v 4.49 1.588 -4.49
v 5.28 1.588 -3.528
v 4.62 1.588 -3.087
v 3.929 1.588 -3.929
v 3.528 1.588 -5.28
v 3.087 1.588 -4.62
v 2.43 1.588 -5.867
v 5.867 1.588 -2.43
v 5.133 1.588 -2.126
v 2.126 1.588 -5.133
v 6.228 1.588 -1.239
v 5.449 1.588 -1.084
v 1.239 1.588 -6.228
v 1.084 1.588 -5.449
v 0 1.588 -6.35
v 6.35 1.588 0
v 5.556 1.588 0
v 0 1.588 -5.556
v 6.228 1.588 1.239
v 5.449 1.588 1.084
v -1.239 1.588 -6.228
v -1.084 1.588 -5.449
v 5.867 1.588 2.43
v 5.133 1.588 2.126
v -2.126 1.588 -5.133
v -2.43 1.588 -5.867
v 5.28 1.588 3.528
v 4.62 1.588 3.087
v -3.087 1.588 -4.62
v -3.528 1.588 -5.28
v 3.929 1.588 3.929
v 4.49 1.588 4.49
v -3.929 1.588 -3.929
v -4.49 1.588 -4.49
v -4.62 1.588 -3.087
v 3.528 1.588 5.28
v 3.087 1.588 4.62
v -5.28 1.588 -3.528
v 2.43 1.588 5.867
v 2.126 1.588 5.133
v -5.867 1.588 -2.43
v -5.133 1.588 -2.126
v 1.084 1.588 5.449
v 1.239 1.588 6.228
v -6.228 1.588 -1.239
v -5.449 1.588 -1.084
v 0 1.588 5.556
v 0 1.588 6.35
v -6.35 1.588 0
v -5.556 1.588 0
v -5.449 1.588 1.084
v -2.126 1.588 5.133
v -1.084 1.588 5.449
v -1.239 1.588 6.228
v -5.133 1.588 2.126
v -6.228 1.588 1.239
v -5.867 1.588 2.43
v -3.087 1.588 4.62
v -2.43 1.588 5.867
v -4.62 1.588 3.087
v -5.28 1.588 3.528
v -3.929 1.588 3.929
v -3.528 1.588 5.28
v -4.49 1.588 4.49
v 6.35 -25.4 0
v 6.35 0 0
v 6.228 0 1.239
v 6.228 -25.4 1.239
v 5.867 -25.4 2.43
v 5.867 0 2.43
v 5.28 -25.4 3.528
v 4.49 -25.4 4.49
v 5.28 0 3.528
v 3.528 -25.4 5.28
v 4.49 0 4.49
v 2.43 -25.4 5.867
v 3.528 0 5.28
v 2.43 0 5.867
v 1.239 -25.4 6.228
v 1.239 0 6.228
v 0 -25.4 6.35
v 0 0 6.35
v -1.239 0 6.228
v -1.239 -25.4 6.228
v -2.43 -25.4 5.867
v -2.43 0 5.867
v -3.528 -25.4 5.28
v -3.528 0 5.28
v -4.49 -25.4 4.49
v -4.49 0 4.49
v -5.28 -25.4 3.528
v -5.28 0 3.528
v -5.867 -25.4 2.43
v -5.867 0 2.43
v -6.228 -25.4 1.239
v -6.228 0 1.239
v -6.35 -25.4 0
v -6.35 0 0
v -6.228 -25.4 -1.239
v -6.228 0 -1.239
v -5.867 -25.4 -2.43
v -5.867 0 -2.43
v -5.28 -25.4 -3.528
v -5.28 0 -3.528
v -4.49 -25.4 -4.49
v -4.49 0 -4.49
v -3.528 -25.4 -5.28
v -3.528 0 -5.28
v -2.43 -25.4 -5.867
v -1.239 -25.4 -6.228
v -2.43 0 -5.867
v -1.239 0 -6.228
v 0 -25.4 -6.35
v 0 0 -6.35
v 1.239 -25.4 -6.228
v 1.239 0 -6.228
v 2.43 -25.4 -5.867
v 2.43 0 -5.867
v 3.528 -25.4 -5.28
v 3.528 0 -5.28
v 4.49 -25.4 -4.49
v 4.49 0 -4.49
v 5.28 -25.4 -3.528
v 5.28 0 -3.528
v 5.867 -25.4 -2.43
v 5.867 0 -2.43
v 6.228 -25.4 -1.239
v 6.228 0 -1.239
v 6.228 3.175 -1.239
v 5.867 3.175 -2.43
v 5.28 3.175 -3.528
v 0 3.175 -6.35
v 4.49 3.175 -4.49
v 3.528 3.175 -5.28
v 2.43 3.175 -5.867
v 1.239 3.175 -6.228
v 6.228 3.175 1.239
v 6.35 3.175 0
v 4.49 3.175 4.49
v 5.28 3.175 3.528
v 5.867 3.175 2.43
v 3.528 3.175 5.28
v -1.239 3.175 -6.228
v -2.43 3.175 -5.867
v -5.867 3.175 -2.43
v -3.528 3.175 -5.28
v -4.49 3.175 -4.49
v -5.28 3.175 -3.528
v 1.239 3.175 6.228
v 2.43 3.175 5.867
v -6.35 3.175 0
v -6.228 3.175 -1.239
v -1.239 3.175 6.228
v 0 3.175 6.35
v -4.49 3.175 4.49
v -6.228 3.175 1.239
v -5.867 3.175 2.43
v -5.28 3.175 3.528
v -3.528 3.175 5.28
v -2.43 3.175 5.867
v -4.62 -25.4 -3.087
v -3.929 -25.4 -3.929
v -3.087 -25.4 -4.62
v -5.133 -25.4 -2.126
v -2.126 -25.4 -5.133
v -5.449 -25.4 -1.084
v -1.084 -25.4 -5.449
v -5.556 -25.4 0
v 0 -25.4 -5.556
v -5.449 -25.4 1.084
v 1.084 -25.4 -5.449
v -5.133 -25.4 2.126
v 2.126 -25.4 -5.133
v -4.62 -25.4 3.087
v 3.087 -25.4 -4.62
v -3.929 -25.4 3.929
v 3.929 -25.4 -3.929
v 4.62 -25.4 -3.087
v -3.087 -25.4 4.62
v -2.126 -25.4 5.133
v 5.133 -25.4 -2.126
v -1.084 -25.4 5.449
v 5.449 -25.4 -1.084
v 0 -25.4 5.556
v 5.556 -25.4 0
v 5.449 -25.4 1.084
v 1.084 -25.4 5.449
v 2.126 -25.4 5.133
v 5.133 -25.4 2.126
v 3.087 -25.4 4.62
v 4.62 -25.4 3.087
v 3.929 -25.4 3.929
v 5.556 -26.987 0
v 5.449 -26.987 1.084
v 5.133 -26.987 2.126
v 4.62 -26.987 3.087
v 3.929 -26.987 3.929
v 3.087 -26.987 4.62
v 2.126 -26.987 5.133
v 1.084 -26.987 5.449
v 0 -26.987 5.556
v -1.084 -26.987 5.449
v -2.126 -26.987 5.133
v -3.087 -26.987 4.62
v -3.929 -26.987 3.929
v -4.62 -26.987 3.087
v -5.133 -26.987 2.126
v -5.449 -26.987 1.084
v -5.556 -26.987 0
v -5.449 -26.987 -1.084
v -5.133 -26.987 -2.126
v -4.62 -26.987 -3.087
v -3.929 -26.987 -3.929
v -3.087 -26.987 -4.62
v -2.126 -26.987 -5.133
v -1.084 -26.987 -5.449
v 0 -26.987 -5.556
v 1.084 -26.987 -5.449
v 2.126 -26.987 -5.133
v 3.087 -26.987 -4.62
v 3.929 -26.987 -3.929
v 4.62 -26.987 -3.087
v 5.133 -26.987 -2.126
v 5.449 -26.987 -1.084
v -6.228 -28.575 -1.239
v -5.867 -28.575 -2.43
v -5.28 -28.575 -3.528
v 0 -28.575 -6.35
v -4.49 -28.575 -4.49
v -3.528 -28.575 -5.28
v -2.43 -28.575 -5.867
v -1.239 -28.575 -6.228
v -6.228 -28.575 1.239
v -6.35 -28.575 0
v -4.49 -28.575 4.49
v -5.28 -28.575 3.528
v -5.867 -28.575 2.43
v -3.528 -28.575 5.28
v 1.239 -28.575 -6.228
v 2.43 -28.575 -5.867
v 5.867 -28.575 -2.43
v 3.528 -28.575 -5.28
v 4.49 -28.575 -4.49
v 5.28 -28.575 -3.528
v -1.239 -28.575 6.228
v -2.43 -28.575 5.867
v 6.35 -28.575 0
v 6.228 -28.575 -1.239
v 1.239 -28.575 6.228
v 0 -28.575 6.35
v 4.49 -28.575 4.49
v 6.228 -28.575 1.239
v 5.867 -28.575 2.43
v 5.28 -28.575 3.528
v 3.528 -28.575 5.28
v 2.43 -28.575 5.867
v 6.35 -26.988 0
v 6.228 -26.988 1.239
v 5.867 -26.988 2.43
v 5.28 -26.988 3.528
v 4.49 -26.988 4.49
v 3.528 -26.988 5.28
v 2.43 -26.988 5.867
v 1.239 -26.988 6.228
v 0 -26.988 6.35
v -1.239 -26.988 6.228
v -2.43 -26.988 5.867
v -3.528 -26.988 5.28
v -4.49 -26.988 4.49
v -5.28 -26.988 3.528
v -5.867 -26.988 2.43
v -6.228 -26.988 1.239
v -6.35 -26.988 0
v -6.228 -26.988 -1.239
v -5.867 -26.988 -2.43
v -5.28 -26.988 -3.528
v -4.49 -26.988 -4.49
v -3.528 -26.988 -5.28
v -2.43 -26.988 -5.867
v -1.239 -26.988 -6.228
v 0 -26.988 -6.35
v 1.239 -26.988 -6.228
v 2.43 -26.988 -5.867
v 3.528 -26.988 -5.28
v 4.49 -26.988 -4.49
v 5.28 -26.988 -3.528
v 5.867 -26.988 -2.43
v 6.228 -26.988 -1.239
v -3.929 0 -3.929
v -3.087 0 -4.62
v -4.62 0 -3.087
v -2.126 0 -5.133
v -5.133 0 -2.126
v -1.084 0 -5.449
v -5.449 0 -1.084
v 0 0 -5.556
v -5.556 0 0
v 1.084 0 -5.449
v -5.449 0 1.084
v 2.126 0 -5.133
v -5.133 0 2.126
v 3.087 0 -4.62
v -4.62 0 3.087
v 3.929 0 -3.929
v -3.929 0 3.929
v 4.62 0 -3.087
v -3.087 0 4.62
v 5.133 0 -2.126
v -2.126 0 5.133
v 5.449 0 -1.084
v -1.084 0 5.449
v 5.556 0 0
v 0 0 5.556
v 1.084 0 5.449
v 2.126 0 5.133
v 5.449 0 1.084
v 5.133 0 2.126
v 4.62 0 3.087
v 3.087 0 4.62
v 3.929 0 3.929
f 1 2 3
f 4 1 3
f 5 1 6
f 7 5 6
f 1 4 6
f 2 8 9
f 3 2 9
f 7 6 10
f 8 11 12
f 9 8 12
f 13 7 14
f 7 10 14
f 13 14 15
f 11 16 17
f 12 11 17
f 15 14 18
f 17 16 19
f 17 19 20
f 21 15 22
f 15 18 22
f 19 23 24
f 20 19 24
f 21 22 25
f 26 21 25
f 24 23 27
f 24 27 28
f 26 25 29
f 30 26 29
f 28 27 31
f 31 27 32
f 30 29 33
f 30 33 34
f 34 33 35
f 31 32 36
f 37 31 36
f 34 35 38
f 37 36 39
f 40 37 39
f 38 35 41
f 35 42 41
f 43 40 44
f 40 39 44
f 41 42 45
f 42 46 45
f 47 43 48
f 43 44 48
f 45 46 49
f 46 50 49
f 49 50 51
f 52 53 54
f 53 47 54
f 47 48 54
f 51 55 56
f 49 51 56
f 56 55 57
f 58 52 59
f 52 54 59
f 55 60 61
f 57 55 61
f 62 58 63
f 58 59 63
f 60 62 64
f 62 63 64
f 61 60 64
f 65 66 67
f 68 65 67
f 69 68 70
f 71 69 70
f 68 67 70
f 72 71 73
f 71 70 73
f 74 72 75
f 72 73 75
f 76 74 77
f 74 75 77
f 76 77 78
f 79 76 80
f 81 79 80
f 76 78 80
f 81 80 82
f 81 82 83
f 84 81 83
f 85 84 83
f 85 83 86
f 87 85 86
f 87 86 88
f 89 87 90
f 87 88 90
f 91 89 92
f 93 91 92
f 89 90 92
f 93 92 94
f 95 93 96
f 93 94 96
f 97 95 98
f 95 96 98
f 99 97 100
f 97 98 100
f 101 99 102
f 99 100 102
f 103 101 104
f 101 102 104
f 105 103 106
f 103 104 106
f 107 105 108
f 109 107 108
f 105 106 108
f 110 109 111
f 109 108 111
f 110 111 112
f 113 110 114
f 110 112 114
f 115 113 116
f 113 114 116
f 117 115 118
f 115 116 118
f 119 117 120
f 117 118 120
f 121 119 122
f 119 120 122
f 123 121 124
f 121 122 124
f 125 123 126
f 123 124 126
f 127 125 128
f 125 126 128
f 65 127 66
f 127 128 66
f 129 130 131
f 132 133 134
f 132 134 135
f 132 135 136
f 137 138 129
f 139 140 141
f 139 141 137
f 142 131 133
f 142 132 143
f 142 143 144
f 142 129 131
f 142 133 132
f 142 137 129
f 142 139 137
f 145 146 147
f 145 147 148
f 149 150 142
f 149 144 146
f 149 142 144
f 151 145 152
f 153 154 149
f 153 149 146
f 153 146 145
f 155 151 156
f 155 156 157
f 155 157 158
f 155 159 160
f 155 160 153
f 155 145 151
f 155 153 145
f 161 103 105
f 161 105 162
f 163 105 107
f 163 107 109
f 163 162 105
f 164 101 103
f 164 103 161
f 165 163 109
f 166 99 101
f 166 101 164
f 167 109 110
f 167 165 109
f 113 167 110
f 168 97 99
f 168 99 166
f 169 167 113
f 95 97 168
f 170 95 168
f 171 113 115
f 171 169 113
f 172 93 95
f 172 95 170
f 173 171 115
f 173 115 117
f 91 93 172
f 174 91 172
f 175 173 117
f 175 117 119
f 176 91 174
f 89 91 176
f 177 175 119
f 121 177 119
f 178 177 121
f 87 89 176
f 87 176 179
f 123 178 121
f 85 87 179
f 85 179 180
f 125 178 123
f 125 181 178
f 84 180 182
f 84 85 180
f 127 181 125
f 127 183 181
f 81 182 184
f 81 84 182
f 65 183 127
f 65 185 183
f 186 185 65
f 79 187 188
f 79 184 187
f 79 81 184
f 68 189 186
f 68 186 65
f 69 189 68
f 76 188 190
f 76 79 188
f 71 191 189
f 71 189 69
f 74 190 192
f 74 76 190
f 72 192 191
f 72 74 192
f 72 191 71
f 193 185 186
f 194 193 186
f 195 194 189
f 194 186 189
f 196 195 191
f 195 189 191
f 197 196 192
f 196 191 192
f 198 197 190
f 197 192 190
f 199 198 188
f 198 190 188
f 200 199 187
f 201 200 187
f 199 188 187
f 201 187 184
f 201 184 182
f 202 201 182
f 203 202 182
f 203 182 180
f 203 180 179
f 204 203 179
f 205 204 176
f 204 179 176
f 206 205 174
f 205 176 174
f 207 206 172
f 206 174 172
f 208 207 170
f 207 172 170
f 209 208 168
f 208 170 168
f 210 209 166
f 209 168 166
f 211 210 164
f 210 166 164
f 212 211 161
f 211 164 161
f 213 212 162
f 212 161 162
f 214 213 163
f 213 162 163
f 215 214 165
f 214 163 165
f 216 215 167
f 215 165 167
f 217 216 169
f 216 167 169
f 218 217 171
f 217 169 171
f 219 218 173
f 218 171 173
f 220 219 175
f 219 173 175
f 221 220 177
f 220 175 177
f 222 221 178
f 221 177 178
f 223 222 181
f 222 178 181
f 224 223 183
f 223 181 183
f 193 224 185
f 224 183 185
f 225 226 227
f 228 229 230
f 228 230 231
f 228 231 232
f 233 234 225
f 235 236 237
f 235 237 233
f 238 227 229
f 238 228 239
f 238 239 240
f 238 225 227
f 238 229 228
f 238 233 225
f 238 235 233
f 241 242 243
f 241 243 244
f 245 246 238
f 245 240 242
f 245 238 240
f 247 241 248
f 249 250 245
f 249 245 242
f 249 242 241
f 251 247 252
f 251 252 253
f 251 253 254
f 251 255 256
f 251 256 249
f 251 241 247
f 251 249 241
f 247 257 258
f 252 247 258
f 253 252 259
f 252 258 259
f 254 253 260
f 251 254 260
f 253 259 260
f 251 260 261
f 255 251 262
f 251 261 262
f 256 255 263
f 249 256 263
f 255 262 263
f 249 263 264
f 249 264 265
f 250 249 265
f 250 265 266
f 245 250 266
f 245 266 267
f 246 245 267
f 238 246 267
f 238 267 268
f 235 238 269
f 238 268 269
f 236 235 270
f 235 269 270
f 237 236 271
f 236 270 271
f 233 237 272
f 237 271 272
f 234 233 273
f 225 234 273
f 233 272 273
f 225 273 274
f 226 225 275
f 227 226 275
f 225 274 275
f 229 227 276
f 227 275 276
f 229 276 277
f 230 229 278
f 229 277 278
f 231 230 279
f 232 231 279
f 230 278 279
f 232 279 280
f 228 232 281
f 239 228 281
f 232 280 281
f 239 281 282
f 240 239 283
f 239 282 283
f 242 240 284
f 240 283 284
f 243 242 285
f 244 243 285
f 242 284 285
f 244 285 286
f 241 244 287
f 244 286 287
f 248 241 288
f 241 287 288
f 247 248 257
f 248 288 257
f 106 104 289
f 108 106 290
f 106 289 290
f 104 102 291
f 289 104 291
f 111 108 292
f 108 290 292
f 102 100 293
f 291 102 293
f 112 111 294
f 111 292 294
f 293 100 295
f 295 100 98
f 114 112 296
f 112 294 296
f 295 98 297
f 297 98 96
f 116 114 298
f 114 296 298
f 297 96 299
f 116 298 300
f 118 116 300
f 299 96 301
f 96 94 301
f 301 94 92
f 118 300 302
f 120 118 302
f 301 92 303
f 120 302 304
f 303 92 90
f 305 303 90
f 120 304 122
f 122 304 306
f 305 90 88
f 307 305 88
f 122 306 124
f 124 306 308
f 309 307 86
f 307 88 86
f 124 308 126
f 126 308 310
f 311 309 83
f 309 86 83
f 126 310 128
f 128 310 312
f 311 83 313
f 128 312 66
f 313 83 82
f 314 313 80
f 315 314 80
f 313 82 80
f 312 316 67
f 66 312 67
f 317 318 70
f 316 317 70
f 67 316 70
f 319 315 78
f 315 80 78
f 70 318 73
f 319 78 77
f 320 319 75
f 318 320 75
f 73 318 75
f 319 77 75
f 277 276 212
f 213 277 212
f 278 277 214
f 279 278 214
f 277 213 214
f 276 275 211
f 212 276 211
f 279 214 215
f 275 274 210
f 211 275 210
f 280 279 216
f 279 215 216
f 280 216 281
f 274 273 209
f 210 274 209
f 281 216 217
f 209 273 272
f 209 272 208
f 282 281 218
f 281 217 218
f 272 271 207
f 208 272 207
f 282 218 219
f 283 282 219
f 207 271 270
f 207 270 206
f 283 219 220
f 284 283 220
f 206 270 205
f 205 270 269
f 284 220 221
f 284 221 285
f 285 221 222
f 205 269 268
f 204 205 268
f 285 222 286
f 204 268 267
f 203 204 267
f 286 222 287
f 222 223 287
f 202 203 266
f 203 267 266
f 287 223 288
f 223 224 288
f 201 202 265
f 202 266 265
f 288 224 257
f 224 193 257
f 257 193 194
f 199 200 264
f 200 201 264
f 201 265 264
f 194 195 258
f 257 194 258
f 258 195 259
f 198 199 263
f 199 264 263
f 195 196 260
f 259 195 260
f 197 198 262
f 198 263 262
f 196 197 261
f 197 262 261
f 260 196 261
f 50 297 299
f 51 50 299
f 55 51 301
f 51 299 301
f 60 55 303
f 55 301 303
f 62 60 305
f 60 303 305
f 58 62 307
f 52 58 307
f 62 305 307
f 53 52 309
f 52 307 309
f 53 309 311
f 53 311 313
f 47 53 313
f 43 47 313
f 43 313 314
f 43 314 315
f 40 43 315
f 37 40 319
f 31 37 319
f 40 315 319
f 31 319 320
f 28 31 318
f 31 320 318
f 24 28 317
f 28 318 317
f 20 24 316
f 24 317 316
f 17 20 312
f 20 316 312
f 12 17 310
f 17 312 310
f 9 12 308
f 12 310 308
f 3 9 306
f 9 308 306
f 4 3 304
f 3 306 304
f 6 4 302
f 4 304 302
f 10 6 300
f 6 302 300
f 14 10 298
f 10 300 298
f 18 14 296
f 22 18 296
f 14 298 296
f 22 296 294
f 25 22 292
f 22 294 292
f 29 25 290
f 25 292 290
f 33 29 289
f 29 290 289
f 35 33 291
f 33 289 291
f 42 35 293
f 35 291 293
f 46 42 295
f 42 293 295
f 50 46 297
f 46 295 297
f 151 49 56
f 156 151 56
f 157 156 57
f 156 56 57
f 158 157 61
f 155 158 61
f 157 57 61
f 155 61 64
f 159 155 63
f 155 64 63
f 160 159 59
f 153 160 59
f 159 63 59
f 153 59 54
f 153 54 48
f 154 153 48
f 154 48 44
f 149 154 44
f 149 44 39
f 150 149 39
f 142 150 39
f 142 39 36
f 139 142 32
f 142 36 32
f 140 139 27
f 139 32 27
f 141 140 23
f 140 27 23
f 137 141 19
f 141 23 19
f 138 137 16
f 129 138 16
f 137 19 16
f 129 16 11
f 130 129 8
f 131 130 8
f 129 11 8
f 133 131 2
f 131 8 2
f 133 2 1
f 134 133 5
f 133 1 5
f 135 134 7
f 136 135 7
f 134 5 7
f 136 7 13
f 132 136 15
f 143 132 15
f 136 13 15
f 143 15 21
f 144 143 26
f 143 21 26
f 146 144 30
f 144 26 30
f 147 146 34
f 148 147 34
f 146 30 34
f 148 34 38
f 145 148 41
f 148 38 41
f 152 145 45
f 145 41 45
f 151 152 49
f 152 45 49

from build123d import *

# Parameters (mm, degrees)
F0_R     = 6.35
F1_DEPTH = 25.4
F2_R     = 5.55625
F3_DEPTH = 1.5875
F4_R     = 6.35
F5_DEPTH = 1.5875
F6_R     = 5.55625
F7_DEPTH = 1.5875
F8_R     = 6.35
F9_DEPTH = 1.5875


with BuildPart() as f1:
    # F0 (on Front) → F1 (new body)
    with BuildSketch(Plane.XZ):
        Circle(F0_R)
    extrude(amount=F1_DEPTH)

    # F2 (on face) → F3 (join)
    with BuildSketch(Plane.XZ.offset(25.4)):
        Circle(F2_R)
    extrude(amount=F3_DEPTH)

    # F4 (on face) → F5 (join)
    with BuildSketch(Plane.XZ.offset(26.9875)):
        Circle(F4_R)
    extrude(amount=F5_DEPTH)

    # F6 (on face) → F7 (join)
    with BuildSketch(Plane(origin=(0, 0, 0), x_dir=(-1, 0, 0), z_dir=(0, 1, 0))):
        Circle(F6_R)
    extrude(amount=F7_DEPTH)

    # F8 (on face) → F9 (join)
    with BuildSketch(Plane(origin=(0, 1.5875, 0), x_dir=(-1, 0, 0), z_dir=(0, 1, 0))):
        Circle(F8_R)
    extrude(amount=F9_DEPTH)


solid = f1.part
